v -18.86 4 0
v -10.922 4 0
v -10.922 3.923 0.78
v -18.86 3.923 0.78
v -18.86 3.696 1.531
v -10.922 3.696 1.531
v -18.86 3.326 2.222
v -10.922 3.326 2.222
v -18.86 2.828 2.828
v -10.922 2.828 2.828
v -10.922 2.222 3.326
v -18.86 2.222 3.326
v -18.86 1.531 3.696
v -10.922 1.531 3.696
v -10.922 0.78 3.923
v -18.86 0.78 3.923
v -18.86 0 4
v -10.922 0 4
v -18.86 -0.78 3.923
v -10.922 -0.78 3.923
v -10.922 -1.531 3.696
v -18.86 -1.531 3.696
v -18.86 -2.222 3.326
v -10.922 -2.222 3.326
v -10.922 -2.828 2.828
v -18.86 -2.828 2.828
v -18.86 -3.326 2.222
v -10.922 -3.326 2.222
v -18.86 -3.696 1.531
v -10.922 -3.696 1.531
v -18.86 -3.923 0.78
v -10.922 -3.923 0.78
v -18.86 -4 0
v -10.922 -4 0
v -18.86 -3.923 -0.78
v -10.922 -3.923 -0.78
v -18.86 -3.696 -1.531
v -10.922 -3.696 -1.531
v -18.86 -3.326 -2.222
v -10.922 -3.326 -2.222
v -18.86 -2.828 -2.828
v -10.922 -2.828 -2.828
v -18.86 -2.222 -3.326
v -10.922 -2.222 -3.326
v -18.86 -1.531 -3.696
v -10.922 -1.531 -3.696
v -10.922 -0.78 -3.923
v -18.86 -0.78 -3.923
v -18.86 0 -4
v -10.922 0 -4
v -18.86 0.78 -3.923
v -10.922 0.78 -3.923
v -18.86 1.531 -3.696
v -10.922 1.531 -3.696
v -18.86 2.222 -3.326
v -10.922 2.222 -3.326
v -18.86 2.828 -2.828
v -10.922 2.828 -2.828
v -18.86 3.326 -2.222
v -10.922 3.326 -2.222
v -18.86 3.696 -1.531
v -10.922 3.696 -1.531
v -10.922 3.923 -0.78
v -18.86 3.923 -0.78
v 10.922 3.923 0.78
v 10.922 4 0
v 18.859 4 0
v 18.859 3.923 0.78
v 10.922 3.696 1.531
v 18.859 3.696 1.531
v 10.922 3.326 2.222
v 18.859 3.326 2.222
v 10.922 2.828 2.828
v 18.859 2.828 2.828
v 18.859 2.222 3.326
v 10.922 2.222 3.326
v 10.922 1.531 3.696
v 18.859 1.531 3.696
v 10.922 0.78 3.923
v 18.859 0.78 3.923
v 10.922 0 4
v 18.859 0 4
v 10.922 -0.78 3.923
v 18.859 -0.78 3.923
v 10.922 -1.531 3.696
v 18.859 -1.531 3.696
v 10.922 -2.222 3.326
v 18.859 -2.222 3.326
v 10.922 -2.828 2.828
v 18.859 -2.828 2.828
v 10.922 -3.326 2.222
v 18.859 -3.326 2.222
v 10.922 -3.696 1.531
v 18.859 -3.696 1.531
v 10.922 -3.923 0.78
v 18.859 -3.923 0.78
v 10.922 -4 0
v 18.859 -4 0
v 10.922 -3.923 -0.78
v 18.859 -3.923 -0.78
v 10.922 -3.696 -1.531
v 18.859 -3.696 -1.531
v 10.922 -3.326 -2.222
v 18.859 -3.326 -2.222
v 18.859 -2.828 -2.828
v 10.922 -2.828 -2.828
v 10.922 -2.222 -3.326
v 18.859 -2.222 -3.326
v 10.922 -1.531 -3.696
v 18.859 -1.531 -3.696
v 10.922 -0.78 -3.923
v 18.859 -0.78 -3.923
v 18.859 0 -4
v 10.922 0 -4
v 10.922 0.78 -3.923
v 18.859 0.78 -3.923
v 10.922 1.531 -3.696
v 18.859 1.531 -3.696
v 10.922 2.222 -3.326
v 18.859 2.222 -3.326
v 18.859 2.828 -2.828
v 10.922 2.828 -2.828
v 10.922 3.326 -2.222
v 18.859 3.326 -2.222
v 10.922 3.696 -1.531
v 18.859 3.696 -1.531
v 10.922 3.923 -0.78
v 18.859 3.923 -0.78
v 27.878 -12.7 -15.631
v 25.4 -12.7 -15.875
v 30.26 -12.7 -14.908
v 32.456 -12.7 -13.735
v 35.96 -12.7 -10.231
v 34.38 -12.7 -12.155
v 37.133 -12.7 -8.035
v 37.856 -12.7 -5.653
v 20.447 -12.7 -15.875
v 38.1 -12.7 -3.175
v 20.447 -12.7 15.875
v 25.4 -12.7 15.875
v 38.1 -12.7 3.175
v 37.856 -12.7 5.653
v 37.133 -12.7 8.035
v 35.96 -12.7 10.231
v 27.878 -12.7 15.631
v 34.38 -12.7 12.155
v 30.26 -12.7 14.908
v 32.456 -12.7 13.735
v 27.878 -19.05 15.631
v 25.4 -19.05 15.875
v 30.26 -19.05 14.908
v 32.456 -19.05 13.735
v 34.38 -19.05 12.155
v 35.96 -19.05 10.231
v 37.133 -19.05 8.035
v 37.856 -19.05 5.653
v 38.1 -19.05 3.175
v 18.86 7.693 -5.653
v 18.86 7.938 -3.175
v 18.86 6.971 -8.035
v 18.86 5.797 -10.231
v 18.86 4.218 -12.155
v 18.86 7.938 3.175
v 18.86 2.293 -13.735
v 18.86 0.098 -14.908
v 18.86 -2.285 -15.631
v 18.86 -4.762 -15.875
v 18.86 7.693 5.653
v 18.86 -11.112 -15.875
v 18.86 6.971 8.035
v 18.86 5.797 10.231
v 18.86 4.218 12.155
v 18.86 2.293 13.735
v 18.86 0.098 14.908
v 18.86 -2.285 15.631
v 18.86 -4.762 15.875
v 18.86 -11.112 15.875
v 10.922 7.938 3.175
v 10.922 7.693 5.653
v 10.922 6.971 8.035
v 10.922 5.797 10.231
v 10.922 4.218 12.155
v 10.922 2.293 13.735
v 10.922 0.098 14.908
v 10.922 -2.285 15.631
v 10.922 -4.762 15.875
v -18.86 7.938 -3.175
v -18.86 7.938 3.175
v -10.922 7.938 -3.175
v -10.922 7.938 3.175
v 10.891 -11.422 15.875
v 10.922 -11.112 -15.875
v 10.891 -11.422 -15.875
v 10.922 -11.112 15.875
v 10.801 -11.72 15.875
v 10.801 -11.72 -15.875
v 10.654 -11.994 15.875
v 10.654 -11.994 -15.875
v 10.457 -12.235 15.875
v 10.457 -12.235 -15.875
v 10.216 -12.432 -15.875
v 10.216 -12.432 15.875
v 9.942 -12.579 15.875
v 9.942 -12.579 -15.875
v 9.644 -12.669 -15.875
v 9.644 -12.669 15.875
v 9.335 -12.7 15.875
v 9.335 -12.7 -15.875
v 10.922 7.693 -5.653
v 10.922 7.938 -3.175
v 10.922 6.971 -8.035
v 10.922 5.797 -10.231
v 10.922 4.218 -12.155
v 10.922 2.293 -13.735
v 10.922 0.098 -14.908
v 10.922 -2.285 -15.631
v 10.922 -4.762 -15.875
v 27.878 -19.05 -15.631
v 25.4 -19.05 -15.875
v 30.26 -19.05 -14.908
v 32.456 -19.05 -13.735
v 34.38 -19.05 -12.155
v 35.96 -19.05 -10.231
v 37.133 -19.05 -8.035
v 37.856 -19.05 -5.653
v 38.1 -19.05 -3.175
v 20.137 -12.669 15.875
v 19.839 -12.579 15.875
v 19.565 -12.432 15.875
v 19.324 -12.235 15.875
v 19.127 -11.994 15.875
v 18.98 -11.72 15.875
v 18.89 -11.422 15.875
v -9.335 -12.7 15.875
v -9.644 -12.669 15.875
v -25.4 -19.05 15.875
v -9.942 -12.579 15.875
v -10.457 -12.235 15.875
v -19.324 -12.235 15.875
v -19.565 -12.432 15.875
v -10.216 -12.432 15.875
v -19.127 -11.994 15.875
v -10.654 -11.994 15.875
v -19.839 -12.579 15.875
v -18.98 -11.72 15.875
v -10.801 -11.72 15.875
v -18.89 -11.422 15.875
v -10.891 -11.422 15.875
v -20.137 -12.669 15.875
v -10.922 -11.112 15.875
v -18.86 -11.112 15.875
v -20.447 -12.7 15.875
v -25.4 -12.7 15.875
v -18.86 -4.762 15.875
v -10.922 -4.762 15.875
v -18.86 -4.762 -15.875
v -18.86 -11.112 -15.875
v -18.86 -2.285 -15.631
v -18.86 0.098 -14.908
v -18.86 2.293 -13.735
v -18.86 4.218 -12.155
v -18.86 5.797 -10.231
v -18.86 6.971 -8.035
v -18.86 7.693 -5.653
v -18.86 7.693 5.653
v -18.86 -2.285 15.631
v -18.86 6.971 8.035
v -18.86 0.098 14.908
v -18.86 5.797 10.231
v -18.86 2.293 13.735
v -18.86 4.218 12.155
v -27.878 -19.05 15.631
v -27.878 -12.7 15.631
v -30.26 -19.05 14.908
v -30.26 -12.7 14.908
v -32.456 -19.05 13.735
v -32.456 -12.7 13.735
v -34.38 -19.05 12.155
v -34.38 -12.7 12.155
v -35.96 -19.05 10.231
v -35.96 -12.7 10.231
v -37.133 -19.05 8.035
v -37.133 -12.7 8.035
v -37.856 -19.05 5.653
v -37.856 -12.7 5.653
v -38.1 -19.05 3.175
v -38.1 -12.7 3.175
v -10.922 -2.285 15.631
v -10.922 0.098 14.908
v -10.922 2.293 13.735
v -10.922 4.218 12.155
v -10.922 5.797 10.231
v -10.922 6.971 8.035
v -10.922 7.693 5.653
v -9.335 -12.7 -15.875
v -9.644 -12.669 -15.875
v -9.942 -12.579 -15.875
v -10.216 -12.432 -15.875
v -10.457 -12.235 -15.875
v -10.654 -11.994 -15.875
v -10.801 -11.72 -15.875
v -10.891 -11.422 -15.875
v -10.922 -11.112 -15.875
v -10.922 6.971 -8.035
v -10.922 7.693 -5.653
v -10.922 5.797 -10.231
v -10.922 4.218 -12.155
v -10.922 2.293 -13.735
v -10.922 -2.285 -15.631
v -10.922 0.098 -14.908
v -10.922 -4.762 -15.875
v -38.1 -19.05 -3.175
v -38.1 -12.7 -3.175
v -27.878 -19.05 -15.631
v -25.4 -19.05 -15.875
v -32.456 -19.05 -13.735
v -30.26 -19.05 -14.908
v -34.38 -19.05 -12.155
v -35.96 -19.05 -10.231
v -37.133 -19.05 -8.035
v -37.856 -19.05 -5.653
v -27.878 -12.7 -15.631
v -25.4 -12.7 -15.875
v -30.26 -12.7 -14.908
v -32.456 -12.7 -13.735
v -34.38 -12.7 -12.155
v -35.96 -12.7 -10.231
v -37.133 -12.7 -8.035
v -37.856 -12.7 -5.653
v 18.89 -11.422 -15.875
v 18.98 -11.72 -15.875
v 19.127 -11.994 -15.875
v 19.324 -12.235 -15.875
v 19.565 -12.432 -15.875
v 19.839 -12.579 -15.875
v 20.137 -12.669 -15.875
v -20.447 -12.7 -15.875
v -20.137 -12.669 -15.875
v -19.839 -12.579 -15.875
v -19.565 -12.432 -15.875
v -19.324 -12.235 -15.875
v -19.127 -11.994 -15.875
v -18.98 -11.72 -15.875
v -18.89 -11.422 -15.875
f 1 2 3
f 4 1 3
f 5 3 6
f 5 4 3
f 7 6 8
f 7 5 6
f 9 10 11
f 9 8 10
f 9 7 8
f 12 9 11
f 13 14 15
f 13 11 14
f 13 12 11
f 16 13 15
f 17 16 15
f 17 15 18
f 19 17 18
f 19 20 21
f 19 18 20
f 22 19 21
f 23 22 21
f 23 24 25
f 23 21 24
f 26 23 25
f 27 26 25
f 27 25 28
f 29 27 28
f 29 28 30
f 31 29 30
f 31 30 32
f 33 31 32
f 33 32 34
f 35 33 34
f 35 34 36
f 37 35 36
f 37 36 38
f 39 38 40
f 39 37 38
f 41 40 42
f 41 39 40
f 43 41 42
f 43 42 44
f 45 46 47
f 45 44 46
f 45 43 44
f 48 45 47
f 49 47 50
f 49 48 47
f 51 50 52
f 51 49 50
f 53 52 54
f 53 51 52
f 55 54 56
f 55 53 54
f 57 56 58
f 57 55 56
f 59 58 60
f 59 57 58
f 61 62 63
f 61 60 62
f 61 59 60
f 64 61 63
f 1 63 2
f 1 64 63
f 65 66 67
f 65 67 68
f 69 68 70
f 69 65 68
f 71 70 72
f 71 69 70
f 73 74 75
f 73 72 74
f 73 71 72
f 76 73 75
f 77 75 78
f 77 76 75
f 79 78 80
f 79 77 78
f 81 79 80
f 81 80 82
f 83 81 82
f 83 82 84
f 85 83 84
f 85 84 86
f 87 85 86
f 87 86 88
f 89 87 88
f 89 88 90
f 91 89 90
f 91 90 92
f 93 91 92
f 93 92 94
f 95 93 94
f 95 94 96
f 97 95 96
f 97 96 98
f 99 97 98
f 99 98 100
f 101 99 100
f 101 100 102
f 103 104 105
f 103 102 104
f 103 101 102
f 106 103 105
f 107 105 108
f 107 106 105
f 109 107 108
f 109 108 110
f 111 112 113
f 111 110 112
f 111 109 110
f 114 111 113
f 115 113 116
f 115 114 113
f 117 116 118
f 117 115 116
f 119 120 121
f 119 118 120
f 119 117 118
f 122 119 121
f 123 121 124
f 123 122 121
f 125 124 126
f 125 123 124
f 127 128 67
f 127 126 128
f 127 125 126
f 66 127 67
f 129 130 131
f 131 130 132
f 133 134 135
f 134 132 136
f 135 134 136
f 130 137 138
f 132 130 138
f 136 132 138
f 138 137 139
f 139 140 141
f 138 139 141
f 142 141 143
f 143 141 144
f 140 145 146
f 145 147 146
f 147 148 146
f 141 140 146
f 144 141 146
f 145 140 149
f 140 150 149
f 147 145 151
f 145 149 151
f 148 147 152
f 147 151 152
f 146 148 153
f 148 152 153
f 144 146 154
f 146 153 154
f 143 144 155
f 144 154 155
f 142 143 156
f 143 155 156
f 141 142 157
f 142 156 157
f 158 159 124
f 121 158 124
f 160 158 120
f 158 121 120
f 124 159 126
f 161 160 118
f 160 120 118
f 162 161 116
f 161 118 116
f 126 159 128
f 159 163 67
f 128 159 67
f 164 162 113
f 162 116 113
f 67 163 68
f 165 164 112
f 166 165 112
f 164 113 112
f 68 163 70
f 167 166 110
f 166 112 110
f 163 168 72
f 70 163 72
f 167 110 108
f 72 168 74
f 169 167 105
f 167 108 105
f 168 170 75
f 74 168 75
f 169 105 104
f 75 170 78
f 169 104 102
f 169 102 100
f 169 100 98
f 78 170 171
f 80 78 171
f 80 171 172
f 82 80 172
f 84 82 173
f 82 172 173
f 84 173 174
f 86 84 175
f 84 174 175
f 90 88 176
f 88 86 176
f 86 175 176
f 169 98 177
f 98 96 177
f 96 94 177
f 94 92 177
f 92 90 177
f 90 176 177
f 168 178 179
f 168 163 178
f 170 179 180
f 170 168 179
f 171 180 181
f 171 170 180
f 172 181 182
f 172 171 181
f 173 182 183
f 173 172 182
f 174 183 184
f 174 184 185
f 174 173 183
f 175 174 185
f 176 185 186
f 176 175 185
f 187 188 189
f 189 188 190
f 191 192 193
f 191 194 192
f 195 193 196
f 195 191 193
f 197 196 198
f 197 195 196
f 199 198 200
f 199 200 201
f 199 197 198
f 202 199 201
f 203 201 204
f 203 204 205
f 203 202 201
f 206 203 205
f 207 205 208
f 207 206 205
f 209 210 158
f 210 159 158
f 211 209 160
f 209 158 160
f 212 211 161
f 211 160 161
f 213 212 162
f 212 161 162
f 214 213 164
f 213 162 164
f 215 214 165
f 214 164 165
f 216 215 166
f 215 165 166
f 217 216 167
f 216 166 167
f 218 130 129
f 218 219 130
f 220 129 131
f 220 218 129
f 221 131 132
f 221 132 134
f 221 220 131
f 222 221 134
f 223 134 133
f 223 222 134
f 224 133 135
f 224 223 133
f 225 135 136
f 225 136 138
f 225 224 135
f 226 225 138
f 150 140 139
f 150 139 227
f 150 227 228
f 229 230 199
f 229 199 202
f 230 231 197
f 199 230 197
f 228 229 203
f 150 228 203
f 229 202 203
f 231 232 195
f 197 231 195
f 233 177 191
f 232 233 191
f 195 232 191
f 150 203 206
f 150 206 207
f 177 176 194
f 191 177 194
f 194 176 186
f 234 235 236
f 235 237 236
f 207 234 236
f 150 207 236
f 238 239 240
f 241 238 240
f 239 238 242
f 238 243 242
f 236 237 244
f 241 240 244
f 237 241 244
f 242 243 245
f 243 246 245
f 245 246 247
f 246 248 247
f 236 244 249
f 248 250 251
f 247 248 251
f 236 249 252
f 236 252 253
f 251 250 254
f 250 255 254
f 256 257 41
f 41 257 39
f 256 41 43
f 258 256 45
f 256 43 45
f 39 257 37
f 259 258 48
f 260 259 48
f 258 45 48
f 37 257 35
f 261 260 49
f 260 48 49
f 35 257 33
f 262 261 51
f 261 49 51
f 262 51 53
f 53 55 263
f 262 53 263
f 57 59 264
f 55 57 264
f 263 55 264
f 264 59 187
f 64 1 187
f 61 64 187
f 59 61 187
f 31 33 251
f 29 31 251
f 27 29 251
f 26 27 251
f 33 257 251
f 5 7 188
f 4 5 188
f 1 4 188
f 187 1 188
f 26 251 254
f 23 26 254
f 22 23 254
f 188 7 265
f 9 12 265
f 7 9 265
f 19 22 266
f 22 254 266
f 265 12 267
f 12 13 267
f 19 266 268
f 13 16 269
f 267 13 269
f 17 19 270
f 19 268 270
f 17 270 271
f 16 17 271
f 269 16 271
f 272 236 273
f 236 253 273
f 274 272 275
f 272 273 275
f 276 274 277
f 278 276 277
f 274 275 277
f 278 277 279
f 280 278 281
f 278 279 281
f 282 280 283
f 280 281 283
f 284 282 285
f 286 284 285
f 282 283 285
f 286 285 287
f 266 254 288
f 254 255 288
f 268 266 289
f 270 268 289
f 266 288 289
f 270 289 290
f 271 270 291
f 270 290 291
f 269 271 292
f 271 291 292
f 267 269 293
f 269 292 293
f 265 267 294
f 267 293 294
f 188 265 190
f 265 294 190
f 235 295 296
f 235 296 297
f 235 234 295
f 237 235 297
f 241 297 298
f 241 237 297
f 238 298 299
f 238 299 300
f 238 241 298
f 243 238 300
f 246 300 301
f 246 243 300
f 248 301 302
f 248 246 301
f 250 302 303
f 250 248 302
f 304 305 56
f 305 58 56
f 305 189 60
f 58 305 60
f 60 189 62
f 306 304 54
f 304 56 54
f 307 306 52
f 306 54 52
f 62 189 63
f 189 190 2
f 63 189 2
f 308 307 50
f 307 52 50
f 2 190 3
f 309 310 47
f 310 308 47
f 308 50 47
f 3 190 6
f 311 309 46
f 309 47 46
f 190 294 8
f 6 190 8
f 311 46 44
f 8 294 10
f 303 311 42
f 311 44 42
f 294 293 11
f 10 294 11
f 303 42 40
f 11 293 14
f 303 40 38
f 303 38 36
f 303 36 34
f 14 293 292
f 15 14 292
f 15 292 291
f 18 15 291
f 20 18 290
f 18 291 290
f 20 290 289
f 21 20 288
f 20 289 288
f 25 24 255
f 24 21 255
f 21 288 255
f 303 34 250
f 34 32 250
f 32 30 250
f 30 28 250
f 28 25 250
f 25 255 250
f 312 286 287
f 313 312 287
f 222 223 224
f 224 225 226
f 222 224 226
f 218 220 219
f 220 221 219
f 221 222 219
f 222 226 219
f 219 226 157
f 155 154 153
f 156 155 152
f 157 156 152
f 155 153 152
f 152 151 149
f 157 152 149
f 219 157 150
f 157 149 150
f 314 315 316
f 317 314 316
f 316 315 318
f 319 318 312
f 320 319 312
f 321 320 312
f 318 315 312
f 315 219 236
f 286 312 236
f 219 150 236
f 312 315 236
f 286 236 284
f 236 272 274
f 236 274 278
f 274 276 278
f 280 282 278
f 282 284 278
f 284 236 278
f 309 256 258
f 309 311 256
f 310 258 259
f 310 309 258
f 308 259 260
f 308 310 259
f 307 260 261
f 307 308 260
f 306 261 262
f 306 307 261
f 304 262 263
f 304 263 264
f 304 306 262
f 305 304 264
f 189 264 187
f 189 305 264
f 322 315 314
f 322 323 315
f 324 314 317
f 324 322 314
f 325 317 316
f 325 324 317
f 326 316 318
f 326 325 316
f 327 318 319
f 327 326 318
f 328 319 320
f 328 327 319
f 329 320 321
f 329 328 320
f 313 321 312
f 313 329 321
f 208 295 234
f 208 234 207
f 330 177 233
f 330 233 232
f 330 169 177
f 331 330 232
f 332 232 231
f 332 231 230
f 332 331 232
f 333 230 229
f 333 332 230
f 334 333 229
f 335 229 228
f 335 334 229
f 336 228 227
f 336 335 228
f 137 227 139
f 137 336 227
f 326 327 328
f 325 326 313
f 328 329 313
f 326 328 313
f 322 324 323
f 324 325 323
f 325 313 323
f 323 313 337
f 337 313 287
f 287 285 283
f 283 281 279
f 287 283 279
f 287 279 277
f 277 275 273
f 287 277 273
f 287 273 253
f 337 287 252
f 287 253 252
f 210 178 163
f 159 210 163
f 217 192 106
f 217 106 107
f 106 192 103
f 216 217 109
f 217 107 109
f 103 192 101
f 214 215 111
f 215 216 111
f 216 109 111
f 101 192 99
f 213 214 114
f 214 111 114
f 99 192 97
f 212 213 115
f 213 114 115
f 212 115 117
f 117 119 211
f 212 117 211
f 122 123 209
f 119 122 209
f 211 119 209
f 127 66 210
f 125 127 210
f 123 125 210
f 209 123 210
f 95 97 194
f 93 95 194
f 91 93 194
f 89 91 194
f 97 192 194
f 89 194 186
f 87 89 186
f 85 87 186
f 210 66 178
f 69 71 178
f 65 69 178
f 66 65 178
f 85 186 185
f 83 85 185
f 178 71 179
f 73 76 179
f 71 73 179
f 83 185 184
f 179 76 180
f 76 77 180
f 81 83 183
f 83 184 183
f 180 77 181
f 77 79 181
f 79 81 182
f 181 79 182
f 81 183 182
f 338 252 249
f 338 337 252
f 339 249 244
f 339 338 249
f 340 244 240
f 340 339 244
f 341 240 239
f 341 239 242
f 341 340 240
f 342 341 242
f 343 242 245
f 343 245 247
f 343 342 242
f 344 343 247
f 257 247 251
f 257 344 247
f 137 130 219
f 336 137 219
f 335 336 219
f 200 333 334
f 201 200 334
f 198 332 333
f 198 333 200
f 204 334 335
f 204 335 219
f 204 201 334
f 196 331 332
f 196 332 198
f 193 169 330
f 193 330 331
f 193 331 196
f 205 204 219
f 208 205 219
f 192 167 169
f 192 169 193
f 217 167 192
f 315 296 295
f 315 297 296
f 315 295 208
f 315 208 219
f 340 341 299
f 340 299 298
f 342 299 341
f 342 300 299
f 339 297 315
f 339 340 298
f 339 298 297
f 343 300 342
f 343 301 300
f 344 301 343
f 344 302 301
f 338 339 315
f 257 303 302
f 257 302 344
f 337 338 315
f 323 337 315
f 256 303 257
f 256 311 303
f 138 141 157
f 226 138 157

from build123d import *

# Parameters (mm, degrees)
BOSS_EXTRUDE1_DEPTH     = 15.875
CUT_EXTRUDE1_DEPTH      = 46.459081876
CUT_EXTRUDE1_DEPTH_BACK = 46.459081876
SKETCH2_R               = 4
FILLET1_R               = 12.7
FILLET2_R               = 1.5875
FILLET3_R               = 12.7


with BuildPart() as part:
    # Sketch1 → Boss-Extrude1 (new, symmetric)
    with BuildSketch(Plane.XY):
        Polygon((10.922, 7.9375), (18.8595, 7.9375), (18.8595, -12.7), (38.1, -12.7), (38.1, -19.05), (-38.1, -19.05), (-38.1, -12.7), (-18.8595, -12.7), (-18.8595, 7.9375), (-10.922, 7.9375), (-10.922, -12.7), (10.922, -12.7), align=None)
    extrude(amount=BOSS_EXTRUDE1_DEPTH, both=True)

    # Sketch2 → Cut-Extrude1 (cut, two sides: drawn at the far end of the back side and taken through both)
    with BuildSketch(Plane(origin=(0, 0, 0), x_dir=(0, 0, -1), z_dir=(1, 0, 0)).offset(-CUT_EXTRUDE1_DEPTH_BACK)):
        with Locations(Location((0, 0, 0), (0, 0, 90))):
            Circle(SKETCH2_R)
    extrude(amount=CUT_EXTRUDE1_DEPTH + CUT_EXTRUDE1_DEPTH_BACK, mode=Mode.SUBTRACT)

    # Fillet1
    fillet1_edges = [part.edges().sort_by_distance(p)[0] for p in [
        (14.89075, 7.9375, -15.875),
        (-14.89075, 7.9375, 15.875),
        (-14.89075, 7.9375, -15.875),
        (14.89075, 7.9375, 15.875),
    ]]
    fillet(fillet1_edges, radius=FILLET1_R)

    # Fillet2
    fillet2_edges = [part.edges().sort_by_distance(p)[0] for p in [
        (18.8595, -12.7, 0),
        (-18.8595, -12.7, 0),
        (-10.922, -12.7, 0),
        (10.922, -12.7, 0),
    ]]
    fillet(fillet2_edges, radius=FILLET2_R)

    # Fillet3
    fillet3_edges = [part.edges().sort_by_distance(p)[0] for p in [
        (38.1, -15.875, -15.875),
        (-38.1, -15.875, -15.875),
        (-38.1, -15.875, 15.875),
        (38.1, -15.875, 15.875),
    ]]
    fillet(fillet3_edges, radius=FILLET3_R)


solid = part.part
